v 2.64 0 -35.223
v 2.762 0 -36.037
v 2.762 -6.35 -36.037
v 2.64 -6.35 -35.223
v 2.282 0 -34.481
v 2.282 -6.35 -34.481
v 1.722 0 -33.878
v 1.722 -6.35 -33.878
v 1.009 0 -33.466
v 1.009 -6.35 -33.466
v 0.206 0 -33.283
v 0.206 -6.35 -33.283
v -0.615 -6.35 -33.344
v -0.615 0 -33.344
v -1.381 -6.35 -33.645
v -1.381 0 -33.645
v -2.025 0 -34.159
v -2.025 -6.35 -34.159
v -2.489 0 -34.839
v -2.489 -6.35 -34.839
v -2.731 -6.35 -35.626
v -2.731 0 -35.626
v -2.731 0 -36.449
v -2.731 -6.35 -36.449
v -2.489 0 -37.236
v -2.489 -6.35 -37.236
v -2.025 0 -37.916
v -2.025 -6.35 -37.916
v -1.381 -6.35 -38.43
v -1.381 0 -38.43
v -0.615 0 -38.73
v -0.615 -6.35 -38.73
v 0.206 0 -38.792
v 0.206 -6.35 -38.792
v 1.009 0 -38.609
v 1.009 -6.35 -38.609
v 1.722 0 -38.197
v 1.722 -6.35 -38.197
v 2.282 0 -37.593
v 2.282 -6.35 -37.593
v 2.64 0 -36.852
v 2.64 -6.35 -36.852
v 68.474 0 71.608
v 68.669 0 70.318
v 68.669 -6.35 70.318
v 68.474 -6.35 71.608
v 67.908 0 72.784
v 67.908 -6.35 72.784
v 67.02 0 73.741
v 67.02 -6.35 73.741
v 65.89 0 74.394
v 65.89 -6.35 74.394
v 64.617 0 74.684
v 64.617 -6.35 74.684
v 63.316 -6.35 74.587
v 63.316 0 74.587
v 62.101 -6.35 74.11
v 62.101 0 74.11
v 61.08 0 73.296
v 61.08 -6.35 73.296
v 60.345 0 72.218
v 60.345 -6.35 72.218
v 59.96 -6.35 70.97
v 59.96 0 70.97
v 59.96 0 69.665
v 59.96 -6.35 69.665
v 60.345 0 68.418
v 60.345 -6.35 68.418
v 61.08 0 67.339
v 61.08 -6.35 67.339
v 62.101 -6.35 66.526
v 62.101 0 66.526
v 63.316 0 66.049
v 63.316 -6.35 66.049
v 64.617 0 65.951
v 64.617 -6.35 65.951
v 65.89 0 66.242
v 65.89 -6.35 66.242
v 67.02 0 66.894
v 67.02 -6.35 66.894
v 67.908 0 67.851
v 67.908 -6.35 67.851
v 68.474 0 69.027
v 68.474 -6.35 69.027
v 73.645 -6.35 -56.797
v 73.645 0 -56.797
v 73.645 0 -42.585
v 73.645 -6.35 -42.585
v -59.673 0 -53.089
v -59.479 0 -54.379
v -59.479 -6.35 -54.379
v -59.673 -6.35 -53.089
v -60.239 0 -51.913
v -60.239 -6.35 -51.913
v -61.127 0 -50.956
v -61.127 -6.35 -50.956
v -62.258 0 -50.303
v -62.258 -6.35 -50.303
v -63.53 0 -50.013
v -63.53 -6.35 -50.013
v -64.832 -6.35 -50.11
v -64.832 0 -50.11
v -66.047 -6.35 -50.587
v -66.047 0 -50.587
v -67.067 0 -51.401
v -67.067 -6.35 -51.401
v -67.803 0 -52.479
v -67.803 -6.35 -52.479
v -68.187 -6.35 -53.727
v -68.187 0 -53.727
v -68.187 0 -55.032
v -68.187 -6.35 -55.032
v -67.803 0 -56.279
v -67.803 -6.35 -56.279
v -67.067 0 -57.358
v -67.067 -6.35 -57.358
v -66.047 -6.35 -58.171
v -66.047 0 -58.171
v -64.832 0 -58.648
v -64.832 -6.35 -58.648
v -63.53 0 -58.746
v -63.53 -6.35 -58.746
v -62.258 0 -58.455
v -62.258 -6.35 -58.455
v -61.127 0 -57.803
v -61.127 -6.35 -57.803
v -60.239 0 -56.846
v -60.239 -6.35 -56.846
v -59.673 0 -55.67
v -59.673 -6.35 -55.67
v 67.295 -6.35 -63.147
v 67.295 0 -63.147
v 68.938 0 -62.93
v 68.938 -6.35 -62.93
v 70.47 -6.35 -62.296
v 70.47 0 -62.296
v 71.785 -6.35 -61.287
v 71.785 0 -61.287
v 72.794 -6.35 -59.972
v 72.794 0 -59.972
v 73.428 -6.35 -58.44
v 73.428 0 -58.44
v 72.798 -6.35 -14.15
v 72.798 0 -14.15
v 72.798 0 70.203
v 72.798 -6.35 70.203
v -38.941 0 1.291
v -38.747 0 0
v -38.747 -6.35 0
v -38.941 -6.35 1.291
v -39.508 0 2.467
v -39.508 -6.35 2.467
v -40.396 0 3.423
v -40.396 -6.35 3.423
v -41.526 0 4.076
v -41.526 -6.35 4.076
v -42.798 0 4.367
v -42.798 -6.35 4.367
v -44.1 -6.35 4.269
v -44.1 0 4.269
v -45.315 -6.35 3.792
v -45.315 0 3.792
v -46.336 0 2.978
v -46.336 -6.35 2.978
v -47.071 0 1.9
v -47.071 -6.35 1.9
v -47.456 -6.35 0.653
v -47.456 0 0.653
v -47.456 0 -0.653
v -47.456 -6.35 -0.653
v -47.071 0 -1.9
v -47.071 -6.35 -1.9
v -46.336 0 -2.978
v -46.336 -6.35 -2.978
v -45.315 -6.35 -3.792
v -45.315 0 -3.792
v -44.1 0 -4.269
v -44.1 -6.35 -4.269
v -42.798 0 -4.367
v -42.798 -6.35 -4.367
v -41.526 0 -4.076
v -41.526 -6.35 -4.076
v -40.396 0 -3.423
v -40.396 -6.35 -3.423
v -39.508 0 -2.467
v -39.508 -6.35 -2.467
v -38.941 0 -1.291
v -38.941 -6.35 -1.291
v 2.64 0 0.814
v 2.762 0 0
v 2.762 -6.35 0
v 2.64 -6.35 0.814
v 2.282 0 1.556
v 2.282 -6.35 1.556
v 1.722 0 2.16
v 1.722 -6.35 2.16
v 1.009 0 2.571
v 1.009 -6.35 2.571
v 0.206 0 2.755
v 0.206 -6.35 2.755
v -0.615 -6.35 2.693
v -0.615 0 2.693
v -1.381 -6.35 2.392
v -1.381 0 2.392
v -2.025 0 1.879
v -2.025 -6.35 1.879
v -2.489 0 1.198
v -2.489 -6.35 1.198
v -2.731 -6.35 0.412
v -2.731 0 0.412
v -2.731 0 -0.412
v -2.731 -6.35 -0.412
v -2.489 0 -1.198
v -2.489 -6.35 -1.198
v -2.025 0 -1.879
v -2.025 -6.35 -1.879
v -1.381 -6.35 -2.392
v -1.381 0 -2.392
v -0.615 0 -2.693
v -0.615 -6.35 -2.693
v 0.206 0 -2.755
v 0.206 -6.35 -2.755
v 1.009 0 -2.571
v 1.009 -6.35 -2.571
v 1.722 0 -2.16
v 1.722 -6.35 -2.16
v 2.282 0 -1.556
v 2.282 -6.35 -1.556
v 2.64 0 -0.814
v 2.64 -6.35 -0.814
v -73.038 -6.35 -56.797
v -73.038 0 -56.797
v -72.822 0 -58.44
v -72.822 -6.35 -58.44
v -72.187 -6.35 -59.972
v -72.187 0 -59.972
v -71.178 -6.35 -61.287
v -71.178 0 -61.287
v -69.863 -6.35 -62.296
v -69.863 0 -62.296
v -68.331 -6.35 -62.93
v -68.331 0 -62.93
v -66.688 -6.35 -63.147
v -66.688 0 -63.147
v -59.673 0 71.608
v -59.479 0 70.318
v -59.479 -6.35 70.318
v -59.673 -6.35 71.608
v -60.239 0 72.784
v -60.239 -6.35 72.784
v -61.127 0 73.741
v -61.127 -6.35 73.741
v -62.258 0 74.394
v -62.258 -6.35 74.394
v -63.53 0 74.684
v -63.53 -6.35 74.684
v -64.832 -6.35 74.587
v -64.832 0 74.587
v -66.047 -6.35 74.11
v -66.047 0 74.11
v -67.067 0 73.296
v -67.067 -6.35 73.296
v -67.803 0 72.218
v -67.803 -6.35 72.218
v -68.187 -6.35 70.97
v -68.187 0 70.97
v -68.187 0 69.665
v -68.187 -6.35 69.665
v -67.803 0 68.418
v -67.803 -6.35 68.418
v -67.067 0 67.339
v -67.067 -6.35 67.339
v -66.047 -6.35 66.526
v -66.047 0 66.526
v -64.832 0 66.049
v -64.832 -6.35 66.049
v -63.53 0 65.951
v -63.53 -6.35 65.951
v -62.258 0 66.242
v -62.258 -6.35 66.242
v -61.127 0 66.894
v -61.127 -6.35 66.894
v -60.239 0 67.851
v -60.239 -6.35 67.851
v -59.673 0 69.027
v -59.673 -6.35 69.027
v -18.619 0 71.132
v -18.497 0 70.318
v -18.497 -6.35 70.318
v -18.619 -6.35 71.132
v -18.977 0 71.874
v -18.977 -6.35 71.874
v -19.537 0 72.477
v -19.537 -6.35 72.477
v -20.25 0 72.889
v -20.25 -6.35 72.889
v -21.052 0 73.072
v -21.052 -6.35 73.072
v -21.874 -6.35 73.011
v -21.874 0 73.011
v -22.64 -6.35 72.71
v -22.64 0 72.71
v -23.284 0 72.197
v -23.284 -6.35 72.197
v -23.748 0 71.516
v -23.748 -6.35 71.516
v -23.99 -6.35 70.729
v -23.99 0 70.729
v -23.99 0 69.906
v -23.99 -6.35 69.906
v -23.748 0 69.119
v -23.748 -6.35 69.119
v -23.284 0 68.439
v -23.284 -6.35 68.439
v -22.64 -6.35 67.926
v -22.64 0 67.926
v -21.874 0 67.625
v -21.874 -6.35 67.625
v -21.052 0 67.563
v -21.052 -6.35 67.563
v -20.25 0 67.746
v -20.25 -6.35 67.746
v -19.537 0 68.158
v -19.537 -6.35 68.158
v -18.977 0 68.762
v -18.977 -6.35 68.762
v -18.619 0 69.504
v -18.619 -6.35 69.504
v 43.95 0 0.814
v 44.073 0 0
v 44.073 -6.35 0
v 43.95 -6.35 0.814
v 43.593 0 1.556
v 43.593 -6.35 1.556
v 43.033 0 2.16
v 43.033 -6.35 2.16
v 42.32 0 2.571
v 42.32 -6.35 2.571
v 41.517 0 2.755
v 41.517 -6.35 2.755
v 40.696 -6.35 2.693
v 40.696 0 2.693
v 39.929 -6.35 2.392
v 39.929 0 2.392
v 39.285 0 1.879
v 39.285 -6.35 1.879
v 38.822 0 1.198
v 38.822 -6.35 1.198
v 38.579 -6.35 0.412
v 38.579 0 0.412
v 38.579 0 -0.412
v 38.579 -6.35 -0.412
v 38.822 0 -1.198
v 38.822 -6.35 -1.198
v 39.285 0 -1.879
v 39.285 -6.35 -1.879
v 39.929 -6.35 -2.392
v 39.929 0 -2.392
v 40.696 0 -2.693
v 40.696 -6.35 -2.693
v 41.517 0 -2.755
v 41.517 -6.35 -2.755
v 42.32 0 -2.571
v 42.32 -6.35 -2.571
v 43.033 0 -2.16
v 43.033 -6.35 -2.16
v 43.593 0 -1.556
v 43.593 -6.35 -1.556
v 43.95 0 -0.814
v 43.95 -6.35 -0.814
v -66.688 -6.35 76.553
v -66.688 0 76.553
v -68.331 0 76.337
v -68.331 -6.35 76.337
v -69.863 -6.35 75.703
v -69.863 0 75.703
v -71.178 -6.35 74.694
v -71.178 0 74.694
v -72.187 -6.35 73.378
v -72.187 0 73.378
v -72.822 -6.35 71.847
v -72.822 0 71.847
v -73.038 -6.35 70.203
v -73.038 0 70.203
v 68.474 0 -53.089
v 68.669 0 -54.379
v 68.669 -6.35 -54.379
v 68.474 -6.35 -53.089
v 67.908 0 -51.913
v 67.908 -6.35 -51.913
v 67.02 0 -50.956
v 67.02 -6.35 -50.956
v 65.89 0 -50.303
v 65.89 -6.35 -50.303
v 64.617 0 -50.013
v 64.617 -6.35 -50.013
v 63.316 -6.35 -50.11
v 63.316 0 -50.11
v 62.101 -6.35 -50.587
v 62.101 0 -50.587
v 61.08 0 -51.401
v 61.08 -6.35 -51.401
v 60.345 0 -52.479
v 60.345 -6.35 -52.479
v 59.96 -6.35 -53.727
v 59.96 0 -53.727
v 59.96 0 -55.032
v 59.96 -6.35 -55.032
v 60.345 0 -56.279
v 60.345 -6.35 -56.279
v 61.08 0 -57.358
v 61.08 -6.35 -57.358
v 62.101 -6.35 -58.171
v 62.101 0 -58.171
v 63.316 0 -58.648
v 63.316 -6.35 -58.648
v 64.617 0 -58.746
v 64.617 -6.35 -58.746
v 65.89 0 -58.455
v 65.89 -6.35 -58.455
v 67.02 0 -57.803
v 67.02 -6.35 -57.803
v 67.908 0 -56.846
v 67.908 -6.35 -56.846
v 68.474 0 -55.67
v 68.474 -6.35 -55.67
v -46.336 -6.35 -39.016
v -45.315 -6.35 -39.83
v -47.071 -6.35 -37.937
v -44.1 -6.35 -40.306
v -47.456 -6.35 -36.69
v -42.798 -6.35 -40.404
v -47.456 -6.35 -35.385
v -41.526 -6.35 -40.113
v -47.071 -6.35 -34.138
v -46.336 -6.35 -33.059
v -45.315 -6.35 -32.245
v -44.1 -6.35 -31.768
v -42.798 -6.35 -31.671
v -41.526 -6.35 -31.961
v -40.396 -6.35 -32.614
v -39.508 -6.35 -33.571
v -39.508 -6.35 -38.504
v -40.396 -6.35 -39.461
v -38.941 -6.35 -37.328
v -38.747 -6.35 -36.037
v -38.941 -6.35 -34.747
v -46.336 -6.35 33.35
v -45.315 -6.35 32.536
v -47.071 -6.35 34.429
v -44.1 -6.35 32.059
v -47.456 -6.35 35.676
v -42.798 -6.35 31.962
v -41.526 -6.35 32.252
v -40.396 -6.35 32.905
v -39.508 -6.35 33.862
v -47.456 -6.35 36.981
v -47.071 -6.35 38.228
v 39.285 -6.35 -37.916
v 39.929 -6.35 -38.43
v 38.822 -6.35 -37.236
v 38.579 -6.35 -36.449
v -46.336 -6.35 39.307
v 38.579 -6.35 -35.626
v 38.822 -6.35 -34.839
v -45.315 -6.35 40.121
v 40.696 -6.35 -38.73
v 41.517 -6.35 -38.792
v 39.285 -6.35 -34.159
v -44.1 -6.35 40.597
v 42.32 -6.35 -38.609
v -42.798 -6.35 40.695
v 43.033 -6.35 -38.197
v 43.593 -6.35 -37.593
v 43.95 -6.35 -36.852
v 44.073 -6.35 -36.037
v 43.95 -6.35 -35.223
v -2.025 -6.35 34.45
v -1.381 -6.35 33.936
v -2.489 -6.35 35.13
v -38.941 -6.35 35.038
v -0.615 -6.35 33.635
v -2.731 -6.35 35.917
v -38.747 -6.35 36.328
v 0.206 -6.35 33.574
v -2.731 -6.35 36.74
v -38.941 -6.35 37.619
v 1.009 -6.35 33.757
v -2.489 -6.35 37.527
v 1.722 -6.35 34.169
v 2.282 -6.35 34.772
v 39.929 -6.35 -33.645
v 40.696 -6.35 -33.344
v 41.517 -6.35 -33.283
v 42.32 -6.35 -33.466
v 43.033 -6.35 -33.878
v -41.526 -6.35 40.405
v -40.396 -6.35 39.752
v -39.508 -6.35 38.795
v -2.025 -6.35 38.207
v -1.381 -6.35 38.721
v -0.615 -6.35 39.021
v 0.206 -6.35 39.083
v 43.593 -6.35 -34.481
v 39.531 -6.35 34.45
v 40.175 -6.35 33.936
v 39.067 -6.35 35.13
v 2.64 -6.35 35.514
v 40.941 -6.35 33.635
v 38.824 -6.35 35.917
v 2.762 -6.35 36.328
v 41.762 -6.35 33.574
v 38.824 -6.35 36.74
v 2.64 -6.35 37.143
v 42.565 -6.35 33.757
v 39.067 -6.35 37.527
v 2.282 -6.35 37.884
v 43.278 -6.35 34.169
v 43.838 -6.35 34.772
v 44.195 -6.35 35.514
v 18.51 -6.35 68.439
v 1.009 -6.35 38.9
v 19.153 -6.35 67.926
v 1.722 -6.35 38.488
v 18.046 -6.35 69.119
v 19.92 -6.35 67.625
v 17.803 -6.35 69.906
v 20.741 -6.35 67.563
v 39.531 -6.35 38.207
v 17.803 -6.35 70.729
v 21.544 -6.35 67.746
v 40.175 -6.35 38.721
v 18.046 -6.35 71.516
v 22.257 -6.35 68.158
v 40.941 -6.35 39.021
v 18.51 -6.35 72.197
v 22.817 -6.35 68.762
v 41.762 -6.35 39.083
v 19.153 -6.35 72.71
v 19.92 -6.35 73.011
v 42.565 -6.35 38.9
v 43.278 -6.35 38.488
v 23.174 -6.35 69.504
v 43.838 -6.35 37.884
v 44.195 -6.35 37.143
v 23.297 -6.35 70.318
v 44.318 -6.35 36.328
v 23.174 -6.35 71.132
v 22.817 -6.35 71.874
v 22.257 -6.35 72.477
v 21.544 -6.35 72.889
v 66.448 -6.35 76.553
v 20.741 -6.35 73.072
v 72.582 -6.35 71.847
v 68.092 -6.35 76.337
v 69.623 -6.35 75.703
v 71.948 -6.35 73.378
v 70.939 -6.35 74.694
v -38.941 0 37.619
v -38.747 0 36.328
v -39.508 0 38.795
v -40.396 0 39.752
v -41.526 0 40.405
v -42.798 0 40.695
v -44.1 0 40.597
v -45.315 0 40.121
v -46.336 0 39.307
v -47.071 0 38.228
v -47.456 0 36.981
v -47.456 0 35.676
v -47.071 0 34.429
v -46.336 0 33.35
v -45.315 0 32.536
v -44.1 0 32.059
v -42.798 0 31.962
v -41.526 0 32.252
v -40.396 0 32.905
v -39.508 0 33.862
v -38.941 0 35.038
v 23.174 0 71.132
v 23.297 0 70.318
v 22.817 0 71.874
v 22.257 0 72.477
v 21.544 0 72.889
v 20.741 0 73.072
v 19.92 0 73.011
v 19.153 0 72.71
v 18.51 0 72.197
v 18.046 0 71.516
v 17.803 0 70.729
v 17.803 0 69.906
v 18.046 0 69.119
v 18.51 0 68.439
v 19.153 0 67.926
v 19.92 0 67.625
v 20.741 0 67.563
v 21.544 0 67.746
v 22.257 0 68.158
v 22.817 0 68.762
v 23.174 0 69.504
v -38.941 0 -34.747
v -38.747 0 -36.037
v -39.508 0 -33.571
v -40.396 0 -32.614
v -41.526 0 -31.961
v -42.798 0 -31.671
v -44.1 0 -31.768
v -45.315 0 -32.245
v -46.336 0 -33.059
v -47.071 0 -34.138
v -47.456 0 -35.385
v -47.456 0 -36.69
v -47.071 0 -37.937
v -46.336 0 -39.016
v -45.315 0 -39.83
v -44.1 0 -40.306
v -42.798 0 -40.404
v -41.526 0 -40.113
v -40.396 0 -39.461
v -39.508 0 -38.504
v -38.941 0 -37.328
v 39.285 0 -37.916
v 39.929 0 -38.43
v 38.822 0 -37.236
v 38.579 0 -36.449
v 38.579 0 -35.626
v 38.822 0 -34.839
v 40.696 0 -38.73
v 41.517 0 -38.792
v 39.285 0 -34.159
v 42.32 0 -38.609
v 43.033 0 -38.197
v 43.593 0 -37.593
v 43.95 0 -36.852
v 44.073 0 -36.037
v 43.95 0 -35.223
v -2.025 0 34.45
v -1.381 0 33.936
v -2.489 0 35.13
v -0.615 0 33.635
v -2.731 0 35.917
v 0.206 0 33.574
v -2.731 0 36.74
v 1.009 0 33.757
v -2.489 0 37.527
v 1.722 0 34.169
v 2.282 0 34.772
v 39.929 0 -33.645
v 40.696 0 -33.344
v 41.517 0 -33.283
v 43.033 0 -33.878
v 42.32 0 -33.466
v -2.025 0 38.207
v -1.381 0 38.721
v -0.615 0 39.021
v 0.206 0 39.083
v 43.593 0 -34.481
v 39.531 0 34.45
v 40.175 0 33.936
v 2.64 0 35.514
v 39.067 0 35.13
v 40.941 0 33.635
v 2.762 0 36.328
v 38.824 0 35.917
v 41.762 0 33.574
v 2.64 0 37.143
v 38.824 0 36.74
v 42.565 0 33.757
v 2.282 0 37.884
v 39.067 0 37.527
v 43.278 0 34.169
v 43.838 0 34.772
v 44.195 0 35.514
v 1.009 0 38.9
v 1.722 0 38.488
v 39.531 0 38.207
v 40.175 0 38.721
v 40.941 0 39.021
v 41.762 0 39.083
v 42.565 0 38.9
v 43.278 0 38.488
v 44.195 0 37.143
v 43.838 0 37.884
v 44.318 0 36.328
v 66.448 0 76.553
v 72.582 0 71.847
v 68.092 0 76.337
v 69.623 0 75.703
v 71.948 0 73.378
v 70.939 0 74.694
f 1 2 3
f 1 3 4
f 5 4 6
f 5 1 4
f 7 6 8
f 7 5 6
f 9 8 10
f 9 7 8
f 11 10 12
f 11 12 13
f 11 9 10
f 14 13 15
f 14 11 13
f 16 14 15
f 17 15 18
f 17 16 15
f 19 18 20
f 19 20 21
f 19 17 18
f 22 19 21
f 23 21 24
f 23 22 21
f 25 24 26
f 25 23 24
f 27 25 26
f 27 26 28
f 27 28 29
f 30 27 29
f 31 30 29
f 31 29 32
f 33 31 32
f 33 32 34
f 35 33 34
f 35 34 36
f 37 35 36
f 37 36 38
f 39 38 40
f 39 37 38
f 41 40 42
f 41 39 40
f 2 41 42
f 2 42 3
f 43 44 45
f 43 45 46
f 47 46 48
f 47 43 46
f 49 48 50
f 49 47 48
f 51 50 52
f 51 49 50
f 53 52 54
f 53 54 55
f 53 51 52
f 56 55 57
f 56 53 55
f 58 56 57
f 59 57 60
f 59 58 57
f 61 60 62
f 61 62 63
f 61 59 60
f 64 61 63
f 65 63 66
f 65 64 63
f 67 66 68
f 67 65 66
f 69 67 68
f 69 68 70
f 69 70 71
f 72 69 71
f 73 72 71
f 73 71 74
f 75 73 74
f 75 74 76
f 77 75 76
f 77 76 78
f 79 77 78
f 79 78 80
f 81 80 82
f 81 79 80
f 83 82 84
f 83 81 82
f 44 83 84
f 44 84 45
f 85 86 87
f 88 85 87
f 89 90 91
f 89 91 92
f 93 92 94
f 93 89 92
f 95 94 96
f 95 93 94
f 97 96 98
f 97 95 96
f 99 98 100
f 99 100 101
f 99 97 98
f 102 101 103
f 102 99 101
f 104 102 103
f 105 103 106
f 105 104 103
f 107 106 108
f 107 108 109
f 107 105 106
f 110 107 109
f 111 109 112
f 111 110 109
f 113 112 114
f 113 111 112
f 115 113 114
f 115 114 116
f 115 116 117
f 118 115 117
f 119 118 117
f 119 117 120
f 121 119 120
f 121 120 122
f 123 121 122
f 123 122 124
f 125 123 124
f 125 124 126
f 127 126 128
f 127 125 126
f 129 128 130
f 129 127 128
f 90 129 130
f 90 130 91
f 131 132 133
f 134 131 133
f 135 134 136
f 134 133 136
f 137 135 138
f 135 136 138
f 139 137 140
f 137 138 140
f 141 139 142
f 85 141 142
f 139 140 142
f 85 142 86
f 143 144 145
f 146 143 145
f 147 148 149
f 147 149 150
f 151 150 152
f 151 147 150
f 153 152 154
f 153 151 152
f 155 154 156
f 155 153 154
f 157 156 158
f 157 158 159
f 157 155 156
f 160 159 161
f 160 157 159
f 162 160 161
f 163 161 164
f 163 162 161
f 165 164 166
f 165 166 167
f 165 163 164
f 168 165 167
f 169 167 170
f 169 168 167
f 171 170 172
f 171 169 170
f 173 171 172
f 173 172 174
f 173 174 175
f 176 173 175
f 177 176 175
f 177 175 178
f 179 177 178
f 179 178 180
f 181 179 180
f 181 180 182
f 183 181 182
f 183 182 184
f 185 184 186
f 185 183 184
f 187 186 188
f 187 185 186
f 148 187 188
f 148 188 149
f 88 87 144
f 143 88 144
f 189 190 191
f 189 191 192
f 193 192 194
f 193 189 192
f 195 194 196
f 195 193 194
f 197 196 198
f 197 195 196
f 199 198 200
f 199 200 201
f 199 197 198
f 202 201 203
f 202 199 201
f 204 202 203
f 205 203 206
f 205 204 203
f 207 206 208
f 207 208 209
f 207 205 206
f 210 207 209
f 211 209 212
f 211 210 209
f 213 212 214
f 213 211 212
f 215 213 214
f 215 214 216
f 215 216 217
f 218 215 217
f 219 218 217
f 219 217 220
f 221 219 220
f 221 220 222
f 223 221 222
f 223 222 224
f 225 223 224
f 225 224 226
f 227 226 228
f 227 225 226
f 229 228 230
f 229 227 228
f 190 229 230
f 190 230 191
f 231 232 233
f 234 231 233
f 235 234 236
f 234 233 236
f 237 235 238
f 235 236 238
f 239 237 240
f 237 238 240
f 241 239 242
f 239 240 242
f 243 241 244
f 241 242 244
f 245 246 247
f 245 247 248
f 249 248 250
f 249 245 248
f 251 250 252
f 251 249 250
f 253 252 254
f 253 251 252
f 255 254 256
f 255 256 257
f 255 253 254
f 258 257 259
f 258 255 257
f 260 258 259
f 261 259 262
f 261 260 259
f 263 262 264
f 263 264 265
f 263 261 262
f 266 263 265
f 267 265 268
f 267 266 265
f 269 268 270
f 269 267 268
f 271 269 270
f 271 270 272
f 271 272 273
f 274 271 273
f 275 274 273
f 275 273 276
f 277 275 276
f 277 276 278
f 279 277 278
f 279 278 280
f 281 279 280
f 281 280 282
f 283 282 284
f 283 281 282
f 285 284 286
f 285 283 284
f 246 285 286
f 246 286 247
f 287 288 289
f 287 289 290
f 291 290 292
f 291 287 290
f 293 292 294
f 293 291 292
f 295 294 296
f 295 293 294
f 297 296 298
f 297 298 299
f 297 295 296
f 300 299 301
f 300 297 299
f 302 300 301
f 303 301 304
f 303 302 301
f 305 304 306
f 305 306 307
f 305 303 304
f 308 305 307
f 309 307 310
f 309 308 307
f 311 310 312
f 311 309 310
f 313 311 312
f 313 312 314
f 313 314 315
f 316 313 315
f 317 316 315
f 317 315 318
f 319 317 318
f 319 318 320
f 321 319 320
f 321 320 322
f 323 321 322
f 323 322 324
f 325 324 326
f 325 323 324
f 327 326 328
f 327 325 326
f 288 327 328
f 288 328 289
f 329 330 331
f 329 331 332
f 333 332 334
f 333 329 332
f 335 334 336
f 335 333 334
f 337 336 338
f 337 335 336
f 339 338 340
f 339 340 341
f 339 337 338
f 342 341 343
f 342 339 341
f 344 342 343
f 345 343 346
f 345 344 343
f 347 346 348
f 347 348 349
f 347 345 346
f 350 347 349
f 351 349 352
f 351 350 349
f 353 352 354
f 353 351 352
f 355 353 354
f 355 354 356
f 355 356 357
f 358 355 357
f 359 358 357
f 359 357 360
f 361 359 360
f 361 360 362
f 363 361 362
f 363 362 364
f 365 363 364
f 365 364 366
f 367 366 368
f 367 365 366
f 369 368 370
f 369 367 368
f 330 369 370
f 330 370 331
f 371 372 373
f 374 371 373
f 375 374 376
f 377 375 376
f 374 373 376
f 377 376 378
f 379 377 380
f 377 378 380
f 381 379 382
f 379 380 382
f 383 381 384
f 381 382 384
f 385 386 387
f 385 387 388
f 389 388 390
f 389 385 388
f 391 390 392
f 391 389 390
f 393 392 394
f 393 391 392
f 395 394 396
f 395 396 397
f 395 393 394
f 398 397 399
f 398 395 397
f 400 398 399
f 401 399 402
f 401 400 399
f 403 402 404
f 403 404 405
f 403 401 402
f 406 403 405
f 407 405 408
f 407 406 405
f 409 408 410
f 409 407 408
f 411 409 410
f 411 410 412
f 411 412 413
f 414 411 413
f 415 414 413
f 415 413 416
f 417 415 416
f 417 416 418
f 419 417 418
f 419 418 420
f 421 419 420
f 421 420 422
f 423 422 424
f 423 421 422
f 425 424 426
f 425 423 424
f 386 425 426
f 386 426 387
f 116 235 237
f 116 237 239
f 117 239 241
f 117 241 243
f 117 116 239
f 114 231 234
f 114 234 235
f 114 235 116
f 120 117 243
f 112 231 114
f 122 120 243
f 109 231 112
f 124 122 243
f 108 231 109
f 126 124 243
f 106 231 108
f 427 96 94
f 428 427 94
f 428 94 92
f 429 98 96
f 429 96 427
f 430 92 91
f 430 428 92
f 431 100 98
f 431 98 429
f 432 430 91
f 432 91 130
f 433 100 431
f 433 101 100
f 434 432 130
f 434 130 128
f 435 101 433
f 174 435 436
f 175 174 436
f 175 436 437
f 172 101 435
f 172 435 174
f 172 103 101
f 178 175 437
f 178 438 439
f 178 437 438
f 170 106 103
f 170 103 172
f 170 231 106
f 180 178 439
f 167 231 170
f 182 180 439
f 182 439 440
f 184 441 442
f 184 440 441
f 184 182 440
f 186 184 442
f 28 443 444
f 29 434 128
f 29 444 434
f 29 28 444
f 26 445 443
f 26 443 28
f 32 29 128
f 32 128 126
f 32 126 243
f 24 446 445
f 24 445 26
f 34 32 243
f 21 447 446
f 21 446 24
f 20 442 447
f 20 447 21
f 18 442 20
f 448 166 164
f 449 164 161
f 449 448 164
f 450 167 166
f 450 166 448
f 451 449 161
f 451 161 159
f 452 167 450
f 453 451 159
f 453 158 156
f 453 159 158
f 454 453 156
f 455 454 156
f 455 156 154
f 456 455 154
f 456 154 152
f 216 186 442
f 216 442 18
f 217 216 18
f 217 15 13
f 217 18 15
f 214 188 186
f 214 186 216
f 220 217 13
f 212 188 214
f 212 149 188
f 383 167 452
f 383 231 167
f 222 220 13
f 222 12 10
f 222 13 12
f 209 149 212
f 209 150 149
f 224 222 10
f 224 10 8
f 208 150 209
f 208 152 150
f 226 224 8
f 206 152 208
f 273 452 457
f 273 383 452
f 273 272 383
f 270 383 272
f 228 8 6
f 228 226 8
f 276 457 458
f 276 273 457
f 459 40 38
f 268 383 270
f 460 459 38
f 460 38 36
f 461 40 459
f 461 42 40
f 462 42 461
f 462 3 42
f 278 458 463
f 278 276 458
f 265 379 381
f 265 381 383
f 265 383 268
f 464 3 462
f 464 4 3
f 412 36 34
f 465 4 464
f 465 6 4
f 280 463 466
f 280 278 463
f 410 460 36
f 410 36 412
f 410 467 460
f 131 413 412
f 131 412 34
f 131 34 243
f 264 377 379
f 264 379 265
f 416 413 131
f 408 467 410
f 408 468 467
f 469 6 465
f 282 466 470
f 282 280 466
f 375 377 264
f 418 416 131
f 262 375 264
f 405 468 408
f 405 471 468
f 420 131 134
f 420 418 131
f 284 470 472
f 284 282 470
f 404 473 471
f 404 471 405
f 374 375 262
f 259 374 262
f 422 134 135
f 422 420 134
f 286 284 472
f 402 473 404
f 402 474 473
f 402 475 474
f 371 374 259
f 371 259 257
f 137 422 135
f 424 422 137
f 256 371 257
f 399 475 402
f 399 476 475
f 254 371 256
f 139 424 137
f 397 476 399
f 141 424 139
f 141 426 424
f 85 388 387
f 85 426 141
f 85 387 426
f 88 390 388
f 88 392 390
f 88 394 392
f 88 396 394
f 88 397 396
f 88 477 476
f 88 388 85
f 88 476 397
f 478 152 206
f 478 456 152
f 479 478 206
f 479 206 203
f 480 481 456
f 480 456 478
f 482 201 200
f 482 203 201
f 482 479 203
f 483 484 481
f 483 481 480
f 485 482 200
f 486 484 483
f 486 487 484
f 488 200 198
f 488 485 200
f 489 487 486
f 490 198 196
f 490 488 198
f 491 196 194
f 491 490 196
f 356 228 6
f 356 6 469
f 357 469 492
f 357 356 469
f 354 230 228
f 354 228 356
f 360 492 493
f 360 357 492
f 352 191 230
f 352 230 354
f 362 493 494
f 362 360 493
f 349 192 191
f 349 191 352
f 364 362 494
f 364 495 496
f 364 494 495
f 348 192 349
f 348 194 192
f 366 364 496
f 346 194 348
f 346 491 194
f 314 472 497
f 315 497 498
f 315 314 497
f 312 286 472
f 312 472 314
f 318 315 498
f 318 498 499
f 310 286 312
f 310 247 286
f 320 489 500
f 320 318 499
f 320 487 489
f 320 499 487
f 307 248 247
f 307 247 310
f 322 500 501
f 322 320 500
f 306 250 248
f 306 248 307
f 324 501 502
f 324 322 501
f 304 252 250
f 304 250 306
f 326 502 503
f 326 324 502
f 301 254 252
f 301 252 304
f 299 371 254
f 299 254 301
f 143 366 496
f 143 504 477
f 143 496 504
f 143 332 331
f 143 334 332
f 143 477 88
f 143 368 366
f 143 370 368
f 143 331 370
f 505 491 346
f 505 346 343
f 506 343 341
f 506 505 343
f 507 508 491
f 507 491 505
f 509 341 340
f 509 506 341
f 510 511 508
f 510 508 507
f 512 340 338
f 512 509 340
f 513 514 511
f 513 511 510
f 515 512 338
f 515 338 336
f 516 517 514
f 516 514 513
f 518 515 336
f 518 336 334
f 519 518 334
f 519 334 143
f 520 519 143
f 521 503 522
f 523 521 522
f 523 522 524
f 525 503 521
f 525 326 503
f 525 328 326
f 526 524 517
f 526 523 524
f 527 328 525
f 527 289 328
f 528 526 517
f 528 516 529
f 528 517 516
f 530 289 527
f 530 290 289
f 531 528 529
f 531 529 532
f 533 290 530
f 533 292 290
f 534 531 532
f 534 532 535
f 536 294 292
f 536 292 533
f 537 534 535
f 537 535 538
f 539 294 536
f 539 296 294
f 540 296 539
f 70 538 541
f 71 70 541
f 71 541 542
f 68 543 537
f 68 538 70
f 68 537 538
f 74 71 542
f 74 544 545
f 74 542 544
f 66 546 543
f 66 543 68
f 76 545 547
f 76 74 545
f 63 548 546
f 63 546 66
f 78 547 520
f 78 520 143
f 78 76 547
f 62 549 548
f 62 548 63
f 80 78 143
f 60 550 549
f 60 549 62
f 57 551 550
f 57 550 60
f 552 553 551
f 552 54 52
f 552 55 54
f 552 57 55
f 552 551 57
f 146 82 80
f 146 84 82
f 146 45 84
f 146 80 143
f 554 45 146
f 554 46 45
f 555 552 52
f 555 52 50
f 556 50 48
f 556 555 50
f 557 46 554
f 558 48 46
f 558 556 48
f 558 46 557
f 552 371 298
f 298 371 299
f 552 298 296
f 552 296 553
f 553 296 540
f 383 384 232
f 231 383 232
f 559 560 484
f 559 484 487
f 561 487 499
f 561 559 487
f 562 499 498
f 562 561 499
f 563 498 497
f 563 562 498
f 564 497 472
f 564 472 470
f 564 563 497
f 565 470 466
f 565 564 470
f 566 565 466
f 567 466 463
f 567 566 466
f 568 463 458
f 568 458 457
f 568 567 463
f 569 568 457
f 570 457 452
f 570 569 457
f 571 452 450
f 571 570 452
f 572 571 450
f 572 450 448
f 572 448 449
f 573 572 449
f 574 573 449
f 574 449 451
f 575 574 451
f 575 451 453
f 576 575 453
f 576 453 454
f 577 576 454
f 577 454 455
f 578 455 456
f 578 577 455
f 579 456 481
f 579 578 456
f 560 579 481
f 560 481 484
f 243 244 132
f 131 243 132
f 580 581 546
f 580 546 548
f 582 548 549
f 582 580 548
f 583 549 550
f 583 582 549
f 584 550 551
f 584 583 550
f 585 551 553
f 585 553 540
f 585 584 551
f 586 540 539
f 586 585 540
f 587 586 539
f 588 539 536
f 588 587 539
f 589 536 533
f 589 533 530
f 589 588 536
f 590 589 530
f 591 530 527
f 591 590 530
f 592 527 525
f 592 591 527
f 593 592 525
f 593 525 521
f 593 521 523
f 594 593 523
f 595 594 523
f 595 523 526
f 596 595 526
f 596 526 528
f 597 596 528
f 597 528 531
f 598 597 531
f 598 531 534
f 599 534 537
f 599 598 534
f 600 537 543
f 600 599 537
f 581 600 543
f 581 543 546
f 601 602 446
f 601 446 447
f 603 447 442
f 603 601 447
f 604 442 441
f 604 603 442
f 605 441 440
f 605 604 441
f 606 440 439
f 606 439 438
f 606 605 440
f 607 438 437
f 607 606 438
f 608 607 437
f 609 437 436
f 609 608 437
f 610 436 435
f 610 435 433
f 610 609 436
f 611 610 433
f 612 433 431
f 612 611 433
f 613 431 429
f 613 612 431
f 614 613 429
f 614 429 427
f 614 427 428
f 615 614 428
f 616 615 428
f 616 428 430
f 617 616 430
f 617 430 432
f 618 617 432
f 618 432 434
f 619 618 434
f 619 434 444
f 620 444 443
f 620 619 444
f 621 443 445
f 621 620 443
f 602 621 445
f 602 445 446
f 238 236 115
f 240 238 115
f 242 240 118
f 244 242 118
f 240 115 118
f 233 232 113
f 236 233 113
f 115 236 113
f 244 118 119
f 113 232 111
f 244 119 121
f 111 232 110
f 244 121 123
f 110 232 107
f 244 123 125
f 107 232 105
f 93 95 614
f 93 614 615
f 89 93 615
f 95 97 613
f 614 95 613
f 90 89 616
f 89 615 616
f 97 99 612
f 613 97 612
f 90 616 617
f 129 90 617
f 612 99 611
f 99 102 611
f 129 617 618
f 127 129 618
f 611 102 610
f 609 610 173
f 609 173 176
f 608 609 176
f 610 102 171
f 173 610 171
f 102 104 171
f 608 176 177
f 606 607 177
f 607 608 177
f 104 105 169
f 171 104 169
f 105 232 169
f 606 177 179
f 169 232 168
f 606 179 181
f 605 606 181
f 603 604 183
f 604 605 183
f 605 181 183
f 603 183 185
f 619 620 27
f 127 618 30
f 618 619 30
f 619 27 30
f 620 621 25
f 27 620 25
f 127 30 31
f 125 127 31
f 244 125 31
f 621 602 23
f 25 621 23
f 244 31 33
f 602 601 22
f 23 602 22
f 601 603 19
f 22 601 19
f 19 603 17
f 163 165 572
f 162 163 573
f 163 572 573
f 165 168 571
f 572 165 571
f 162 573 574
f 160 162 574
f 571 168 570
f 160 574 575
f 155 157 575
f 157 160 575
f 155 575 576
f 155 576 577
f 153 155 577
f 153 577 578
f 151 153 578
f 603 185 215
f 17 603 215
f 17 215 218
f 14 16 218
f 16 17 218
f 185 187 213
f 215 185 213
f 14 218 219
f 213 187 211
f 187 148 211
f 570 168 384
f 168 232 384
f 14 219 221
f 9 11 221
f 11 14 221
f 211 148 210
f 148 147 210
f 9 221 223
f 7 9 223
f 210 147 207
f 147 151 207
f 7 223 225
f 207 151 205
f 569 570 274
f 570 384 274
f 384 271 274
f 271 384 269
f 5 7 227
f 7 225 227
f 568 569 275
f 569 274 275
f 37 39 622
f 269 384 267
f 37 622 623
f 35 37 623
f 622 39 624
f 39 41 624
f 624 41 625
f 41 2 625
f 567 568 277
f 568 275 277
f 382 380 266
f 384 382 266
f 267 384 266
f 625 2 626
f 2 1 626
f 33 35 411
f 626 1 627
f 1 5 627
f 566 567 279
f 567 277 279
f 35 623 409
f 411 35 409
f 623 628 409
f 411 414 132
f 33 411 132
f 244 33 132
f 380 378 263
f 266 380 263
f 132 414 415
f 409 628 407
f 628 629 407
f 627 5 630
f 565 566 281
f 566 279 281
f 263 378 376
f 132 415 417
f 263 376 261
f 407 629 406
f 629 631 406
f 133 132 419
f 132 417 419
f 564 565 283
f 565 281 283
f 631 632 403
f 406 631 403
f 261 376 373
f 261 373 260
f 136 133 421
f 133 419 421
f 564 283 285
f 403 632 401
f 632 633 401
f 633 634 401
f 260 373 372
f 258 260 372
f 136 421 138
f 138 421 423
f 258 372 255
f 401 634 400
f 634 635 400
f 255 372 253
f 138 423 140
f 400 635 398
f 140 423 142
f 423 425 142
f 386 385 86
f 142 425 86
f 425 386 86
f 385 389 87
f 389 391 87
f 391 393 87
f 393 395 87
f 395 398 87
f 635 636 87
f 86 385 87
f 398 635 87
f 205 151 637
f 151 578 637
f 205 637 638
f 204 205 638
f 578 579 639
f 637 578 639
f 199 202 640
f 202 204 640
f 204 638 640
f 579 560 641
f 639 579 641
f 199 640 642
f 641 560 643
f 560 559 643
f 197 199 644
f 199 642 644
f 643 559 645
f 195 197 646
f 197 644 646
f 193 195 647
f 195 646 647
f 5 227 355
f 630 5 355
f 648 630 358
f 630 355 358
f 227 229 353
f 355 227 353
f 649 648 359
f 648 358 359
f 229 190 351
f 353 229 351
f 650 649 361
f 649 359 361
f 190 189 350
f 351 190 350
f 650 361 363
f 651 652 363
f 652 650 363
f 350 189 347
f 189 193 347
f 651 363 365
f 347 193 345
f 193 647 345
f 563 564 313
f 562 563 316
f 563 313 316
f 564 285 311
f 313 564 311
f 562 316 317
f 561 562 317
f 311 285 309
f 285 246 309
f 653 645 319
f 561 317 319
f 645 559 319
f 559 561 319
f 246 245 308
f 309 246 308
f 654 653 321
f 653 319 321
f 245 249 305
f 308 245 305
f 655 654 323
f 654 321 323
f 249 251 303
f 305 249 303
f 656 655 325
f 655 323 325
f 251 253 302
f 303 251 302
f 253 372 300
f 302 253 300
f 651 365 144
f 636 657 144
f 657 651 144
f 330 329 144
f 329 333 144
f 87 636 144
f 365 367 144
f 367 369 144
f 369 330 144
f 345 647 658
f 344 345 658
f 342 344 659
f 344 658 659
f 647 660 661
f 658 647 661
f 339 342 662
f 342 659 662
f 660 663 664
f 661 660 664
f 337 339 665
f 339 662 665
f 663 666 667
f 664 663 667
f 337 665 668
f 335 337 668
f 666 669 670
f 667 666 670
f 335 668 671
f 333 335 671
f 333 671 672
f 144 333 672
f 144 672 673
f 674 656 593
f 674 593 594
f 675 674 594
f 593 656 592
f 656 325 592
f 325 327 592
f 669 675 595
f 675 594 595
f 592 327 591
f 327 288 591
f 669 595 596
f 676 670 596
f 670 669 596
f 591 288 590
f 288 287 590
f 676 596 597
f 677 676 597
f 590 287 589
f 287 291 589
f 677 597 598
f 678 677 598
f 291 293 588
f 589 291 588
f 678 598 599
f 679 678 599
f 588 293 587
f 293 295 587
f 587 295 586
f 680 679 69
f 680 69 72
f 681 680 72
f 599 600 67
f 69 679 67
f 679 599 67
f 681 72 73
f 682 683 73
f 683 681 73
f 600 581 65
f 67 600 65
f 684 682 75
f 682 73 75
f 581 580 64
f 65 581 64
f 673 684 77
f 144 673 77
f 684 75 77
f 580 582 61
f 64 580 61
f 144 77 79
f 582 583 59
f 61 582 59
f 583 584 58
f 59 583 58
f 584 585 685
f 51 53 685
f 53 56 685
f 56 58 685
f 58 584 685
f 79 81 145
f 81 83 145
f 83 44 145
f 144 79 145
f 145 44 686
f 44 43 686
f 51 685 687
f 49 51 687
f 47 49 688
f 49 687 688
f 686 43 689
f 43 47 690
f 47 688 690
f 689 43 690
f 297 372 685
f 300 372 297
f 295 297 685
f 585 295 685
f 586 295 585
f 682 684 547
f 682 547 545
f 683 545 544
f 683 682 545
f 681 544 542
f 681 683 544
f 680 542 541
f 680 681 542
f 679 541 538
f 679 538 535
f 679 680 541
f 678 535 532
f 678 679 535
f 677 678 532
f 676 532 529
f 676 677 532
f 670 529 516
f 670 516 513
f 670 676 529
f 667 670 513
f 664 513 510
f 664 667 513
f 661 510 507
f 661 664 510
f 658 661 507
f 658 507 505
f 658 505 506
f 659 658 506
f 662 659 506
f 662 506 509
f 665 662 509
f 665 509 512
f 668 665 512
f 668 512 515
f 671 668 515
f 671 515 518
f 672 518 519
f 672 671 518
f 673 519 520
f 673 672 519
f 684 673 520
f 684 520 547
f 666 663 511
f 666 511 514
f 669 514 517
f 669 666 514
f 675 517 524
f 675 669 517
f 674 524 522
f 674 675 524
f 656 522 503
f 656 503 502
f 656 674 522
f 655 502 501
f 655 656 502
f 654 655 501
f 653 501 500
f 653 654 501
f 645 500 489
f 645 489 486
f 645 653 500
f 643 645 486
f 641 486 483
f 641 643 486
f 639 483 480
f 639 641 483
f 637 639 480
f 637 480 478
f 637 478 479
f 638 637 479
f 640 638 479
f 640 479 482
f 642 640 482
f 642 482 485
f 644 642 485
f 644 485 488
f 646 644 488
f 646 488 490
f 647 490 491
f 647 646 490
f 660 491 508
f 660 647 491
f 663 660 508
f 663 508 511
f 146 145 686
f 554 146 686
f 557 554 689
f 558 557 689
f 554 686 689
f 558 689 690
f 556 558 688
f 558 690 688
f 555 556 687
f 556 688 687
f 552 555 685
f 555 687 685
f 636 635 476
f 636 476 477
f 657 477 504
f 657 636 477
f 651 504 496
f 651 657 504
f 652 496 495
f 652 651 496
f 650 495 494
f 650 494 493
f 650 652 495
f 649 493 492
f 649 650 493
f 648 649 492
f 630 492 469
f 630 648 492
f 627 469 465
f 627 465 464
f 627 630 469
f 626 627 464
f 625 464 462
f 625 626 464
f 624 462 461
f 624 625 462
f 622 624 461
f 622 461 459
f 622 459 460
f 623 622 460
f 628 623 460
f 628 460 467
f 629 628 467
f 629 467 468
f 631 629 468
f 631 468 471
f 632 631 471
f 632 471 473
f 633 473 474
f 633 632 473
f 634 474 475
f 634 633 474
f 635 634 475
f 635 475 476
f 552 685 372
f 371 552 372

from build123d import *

# Parameters (mm, degrees)
F0_R     = 4.3787819408
F0_R_2   = 2.76225
F1_DEPTH = 6.35


# Not quite as in the source:
# - a feature names something its author has since deleted; it is built from what else it names


with BuildPart() as f1:
    # F0 (on Front) → F1 (new body)
    with BuildSketch(Plane.XZ):
        with BuildLine():
            ThreePointArc((72.7984449517, 70.2034191426), (70.9385730123, 74.6935472031), (66.4484449517, 76.5534191426))
            Line((66.4484449517, 76.5534191426), (-66.6879298329, 76.5534191426))
            ThreePointArc((-66.6879298329, 76.5534191426), (-71.1780578935, 74.6935472031), (-73.0379298329, 70.2034191426))
            Line((-73.0379298329, 70.2034191426), (-73.0379298329, -14.1499808574))
            Line((-73.0379298329, -14.1499808574), (-73.0379298329, -42.5979808574))
            Line((-73.0379298329, -42.5979808574), (-73.0379298329, -56.7965808574))
            ThreePointArc((-73.0379298329, -56.7965808574), (-71.1780578935, -61.286708918), (-66.6879298329, -63.1465808574))
            Line((-66.6879298329, -63.1465808574), (67.2946030807, -63.1465808574))
            ThreePointArc((67.2946030807, -63.1465808574), (71.7847311412, -61.286708918), (73.6446030807, -56.7965808574))
            Line((73.6446030807, -56.7965808574), (73.6446030807, -42.5853939971))
            Line((73.6446030807, -42.5853939971), (72.7984449517, -14.1499808574))
            Line((72.7984449517, -14.1499808574), (72.7984449517, 70.2034191426))
        make_face()
        with Locations((-63.8573840261, -54.3791967528)):
            Circle(F0_R, mode=Mode.SUBTRACT)
        with Locations((-43.1257002056, -36.0373866536)):
            Circle(F0_R, mode=Mode.SUBTRACT)
        with Locations((0, -36.0373866536)):
            Circle(F0_R_2, mode=Mode.SUBTRACT)
        with Locations((-43.1257002056, 0)):
            Circle(F0_R, mode=Mode.SUBTRACT)
        Circle(F0_R_2, mode=Mode.SUBTRACT)
        with Locations((64.2901332332, -54.3791967528)):
            Circle(F0_R, mode=Mode.SUBTRACT)
        with Locations((41.3103699684, -36.0373866536)):
            Circle(F0_R_2, mode=Mode.SUBTRACT)
        with Locations((41.3103699684, 0)):
            Circle(F0_R_2, mode=Mode.SUBTRACT)
        with Locations((-43.1257002056, 36.3284125924)):
            Circle(F0_R, mode=Mode.SUBTRACT)
        with Locations((0, 36.3284125924)):
            Circle(F0_R_2, mode=Mode.SUBTRACT)
        with Locations((-63.8573840261, 70.3177154064)):
            Circle(F0_R, mode=Mode.SUBTRACT)
        with Locations((-21.2588757277, 70.3177154064)):
            Circle(F0_R_2, mode=Mode.SUBTRACT)
        with Locations((41.5558456844, 36.3284125924)):
            Circle(F0_R_2, mode=Mode.SUBTRACT)
        with Locations((20.5344017595, 70.3177154064)):
            Circle(F0_R_2, mode=Mode.SUBTRACT)
        with Locations((64.2901332332, 70.3177154064)):
            Circle(F0_R, mode=Mode.SUBTRACT)
    extrude(amount=F1_DEPTH)


solid = f1.part
